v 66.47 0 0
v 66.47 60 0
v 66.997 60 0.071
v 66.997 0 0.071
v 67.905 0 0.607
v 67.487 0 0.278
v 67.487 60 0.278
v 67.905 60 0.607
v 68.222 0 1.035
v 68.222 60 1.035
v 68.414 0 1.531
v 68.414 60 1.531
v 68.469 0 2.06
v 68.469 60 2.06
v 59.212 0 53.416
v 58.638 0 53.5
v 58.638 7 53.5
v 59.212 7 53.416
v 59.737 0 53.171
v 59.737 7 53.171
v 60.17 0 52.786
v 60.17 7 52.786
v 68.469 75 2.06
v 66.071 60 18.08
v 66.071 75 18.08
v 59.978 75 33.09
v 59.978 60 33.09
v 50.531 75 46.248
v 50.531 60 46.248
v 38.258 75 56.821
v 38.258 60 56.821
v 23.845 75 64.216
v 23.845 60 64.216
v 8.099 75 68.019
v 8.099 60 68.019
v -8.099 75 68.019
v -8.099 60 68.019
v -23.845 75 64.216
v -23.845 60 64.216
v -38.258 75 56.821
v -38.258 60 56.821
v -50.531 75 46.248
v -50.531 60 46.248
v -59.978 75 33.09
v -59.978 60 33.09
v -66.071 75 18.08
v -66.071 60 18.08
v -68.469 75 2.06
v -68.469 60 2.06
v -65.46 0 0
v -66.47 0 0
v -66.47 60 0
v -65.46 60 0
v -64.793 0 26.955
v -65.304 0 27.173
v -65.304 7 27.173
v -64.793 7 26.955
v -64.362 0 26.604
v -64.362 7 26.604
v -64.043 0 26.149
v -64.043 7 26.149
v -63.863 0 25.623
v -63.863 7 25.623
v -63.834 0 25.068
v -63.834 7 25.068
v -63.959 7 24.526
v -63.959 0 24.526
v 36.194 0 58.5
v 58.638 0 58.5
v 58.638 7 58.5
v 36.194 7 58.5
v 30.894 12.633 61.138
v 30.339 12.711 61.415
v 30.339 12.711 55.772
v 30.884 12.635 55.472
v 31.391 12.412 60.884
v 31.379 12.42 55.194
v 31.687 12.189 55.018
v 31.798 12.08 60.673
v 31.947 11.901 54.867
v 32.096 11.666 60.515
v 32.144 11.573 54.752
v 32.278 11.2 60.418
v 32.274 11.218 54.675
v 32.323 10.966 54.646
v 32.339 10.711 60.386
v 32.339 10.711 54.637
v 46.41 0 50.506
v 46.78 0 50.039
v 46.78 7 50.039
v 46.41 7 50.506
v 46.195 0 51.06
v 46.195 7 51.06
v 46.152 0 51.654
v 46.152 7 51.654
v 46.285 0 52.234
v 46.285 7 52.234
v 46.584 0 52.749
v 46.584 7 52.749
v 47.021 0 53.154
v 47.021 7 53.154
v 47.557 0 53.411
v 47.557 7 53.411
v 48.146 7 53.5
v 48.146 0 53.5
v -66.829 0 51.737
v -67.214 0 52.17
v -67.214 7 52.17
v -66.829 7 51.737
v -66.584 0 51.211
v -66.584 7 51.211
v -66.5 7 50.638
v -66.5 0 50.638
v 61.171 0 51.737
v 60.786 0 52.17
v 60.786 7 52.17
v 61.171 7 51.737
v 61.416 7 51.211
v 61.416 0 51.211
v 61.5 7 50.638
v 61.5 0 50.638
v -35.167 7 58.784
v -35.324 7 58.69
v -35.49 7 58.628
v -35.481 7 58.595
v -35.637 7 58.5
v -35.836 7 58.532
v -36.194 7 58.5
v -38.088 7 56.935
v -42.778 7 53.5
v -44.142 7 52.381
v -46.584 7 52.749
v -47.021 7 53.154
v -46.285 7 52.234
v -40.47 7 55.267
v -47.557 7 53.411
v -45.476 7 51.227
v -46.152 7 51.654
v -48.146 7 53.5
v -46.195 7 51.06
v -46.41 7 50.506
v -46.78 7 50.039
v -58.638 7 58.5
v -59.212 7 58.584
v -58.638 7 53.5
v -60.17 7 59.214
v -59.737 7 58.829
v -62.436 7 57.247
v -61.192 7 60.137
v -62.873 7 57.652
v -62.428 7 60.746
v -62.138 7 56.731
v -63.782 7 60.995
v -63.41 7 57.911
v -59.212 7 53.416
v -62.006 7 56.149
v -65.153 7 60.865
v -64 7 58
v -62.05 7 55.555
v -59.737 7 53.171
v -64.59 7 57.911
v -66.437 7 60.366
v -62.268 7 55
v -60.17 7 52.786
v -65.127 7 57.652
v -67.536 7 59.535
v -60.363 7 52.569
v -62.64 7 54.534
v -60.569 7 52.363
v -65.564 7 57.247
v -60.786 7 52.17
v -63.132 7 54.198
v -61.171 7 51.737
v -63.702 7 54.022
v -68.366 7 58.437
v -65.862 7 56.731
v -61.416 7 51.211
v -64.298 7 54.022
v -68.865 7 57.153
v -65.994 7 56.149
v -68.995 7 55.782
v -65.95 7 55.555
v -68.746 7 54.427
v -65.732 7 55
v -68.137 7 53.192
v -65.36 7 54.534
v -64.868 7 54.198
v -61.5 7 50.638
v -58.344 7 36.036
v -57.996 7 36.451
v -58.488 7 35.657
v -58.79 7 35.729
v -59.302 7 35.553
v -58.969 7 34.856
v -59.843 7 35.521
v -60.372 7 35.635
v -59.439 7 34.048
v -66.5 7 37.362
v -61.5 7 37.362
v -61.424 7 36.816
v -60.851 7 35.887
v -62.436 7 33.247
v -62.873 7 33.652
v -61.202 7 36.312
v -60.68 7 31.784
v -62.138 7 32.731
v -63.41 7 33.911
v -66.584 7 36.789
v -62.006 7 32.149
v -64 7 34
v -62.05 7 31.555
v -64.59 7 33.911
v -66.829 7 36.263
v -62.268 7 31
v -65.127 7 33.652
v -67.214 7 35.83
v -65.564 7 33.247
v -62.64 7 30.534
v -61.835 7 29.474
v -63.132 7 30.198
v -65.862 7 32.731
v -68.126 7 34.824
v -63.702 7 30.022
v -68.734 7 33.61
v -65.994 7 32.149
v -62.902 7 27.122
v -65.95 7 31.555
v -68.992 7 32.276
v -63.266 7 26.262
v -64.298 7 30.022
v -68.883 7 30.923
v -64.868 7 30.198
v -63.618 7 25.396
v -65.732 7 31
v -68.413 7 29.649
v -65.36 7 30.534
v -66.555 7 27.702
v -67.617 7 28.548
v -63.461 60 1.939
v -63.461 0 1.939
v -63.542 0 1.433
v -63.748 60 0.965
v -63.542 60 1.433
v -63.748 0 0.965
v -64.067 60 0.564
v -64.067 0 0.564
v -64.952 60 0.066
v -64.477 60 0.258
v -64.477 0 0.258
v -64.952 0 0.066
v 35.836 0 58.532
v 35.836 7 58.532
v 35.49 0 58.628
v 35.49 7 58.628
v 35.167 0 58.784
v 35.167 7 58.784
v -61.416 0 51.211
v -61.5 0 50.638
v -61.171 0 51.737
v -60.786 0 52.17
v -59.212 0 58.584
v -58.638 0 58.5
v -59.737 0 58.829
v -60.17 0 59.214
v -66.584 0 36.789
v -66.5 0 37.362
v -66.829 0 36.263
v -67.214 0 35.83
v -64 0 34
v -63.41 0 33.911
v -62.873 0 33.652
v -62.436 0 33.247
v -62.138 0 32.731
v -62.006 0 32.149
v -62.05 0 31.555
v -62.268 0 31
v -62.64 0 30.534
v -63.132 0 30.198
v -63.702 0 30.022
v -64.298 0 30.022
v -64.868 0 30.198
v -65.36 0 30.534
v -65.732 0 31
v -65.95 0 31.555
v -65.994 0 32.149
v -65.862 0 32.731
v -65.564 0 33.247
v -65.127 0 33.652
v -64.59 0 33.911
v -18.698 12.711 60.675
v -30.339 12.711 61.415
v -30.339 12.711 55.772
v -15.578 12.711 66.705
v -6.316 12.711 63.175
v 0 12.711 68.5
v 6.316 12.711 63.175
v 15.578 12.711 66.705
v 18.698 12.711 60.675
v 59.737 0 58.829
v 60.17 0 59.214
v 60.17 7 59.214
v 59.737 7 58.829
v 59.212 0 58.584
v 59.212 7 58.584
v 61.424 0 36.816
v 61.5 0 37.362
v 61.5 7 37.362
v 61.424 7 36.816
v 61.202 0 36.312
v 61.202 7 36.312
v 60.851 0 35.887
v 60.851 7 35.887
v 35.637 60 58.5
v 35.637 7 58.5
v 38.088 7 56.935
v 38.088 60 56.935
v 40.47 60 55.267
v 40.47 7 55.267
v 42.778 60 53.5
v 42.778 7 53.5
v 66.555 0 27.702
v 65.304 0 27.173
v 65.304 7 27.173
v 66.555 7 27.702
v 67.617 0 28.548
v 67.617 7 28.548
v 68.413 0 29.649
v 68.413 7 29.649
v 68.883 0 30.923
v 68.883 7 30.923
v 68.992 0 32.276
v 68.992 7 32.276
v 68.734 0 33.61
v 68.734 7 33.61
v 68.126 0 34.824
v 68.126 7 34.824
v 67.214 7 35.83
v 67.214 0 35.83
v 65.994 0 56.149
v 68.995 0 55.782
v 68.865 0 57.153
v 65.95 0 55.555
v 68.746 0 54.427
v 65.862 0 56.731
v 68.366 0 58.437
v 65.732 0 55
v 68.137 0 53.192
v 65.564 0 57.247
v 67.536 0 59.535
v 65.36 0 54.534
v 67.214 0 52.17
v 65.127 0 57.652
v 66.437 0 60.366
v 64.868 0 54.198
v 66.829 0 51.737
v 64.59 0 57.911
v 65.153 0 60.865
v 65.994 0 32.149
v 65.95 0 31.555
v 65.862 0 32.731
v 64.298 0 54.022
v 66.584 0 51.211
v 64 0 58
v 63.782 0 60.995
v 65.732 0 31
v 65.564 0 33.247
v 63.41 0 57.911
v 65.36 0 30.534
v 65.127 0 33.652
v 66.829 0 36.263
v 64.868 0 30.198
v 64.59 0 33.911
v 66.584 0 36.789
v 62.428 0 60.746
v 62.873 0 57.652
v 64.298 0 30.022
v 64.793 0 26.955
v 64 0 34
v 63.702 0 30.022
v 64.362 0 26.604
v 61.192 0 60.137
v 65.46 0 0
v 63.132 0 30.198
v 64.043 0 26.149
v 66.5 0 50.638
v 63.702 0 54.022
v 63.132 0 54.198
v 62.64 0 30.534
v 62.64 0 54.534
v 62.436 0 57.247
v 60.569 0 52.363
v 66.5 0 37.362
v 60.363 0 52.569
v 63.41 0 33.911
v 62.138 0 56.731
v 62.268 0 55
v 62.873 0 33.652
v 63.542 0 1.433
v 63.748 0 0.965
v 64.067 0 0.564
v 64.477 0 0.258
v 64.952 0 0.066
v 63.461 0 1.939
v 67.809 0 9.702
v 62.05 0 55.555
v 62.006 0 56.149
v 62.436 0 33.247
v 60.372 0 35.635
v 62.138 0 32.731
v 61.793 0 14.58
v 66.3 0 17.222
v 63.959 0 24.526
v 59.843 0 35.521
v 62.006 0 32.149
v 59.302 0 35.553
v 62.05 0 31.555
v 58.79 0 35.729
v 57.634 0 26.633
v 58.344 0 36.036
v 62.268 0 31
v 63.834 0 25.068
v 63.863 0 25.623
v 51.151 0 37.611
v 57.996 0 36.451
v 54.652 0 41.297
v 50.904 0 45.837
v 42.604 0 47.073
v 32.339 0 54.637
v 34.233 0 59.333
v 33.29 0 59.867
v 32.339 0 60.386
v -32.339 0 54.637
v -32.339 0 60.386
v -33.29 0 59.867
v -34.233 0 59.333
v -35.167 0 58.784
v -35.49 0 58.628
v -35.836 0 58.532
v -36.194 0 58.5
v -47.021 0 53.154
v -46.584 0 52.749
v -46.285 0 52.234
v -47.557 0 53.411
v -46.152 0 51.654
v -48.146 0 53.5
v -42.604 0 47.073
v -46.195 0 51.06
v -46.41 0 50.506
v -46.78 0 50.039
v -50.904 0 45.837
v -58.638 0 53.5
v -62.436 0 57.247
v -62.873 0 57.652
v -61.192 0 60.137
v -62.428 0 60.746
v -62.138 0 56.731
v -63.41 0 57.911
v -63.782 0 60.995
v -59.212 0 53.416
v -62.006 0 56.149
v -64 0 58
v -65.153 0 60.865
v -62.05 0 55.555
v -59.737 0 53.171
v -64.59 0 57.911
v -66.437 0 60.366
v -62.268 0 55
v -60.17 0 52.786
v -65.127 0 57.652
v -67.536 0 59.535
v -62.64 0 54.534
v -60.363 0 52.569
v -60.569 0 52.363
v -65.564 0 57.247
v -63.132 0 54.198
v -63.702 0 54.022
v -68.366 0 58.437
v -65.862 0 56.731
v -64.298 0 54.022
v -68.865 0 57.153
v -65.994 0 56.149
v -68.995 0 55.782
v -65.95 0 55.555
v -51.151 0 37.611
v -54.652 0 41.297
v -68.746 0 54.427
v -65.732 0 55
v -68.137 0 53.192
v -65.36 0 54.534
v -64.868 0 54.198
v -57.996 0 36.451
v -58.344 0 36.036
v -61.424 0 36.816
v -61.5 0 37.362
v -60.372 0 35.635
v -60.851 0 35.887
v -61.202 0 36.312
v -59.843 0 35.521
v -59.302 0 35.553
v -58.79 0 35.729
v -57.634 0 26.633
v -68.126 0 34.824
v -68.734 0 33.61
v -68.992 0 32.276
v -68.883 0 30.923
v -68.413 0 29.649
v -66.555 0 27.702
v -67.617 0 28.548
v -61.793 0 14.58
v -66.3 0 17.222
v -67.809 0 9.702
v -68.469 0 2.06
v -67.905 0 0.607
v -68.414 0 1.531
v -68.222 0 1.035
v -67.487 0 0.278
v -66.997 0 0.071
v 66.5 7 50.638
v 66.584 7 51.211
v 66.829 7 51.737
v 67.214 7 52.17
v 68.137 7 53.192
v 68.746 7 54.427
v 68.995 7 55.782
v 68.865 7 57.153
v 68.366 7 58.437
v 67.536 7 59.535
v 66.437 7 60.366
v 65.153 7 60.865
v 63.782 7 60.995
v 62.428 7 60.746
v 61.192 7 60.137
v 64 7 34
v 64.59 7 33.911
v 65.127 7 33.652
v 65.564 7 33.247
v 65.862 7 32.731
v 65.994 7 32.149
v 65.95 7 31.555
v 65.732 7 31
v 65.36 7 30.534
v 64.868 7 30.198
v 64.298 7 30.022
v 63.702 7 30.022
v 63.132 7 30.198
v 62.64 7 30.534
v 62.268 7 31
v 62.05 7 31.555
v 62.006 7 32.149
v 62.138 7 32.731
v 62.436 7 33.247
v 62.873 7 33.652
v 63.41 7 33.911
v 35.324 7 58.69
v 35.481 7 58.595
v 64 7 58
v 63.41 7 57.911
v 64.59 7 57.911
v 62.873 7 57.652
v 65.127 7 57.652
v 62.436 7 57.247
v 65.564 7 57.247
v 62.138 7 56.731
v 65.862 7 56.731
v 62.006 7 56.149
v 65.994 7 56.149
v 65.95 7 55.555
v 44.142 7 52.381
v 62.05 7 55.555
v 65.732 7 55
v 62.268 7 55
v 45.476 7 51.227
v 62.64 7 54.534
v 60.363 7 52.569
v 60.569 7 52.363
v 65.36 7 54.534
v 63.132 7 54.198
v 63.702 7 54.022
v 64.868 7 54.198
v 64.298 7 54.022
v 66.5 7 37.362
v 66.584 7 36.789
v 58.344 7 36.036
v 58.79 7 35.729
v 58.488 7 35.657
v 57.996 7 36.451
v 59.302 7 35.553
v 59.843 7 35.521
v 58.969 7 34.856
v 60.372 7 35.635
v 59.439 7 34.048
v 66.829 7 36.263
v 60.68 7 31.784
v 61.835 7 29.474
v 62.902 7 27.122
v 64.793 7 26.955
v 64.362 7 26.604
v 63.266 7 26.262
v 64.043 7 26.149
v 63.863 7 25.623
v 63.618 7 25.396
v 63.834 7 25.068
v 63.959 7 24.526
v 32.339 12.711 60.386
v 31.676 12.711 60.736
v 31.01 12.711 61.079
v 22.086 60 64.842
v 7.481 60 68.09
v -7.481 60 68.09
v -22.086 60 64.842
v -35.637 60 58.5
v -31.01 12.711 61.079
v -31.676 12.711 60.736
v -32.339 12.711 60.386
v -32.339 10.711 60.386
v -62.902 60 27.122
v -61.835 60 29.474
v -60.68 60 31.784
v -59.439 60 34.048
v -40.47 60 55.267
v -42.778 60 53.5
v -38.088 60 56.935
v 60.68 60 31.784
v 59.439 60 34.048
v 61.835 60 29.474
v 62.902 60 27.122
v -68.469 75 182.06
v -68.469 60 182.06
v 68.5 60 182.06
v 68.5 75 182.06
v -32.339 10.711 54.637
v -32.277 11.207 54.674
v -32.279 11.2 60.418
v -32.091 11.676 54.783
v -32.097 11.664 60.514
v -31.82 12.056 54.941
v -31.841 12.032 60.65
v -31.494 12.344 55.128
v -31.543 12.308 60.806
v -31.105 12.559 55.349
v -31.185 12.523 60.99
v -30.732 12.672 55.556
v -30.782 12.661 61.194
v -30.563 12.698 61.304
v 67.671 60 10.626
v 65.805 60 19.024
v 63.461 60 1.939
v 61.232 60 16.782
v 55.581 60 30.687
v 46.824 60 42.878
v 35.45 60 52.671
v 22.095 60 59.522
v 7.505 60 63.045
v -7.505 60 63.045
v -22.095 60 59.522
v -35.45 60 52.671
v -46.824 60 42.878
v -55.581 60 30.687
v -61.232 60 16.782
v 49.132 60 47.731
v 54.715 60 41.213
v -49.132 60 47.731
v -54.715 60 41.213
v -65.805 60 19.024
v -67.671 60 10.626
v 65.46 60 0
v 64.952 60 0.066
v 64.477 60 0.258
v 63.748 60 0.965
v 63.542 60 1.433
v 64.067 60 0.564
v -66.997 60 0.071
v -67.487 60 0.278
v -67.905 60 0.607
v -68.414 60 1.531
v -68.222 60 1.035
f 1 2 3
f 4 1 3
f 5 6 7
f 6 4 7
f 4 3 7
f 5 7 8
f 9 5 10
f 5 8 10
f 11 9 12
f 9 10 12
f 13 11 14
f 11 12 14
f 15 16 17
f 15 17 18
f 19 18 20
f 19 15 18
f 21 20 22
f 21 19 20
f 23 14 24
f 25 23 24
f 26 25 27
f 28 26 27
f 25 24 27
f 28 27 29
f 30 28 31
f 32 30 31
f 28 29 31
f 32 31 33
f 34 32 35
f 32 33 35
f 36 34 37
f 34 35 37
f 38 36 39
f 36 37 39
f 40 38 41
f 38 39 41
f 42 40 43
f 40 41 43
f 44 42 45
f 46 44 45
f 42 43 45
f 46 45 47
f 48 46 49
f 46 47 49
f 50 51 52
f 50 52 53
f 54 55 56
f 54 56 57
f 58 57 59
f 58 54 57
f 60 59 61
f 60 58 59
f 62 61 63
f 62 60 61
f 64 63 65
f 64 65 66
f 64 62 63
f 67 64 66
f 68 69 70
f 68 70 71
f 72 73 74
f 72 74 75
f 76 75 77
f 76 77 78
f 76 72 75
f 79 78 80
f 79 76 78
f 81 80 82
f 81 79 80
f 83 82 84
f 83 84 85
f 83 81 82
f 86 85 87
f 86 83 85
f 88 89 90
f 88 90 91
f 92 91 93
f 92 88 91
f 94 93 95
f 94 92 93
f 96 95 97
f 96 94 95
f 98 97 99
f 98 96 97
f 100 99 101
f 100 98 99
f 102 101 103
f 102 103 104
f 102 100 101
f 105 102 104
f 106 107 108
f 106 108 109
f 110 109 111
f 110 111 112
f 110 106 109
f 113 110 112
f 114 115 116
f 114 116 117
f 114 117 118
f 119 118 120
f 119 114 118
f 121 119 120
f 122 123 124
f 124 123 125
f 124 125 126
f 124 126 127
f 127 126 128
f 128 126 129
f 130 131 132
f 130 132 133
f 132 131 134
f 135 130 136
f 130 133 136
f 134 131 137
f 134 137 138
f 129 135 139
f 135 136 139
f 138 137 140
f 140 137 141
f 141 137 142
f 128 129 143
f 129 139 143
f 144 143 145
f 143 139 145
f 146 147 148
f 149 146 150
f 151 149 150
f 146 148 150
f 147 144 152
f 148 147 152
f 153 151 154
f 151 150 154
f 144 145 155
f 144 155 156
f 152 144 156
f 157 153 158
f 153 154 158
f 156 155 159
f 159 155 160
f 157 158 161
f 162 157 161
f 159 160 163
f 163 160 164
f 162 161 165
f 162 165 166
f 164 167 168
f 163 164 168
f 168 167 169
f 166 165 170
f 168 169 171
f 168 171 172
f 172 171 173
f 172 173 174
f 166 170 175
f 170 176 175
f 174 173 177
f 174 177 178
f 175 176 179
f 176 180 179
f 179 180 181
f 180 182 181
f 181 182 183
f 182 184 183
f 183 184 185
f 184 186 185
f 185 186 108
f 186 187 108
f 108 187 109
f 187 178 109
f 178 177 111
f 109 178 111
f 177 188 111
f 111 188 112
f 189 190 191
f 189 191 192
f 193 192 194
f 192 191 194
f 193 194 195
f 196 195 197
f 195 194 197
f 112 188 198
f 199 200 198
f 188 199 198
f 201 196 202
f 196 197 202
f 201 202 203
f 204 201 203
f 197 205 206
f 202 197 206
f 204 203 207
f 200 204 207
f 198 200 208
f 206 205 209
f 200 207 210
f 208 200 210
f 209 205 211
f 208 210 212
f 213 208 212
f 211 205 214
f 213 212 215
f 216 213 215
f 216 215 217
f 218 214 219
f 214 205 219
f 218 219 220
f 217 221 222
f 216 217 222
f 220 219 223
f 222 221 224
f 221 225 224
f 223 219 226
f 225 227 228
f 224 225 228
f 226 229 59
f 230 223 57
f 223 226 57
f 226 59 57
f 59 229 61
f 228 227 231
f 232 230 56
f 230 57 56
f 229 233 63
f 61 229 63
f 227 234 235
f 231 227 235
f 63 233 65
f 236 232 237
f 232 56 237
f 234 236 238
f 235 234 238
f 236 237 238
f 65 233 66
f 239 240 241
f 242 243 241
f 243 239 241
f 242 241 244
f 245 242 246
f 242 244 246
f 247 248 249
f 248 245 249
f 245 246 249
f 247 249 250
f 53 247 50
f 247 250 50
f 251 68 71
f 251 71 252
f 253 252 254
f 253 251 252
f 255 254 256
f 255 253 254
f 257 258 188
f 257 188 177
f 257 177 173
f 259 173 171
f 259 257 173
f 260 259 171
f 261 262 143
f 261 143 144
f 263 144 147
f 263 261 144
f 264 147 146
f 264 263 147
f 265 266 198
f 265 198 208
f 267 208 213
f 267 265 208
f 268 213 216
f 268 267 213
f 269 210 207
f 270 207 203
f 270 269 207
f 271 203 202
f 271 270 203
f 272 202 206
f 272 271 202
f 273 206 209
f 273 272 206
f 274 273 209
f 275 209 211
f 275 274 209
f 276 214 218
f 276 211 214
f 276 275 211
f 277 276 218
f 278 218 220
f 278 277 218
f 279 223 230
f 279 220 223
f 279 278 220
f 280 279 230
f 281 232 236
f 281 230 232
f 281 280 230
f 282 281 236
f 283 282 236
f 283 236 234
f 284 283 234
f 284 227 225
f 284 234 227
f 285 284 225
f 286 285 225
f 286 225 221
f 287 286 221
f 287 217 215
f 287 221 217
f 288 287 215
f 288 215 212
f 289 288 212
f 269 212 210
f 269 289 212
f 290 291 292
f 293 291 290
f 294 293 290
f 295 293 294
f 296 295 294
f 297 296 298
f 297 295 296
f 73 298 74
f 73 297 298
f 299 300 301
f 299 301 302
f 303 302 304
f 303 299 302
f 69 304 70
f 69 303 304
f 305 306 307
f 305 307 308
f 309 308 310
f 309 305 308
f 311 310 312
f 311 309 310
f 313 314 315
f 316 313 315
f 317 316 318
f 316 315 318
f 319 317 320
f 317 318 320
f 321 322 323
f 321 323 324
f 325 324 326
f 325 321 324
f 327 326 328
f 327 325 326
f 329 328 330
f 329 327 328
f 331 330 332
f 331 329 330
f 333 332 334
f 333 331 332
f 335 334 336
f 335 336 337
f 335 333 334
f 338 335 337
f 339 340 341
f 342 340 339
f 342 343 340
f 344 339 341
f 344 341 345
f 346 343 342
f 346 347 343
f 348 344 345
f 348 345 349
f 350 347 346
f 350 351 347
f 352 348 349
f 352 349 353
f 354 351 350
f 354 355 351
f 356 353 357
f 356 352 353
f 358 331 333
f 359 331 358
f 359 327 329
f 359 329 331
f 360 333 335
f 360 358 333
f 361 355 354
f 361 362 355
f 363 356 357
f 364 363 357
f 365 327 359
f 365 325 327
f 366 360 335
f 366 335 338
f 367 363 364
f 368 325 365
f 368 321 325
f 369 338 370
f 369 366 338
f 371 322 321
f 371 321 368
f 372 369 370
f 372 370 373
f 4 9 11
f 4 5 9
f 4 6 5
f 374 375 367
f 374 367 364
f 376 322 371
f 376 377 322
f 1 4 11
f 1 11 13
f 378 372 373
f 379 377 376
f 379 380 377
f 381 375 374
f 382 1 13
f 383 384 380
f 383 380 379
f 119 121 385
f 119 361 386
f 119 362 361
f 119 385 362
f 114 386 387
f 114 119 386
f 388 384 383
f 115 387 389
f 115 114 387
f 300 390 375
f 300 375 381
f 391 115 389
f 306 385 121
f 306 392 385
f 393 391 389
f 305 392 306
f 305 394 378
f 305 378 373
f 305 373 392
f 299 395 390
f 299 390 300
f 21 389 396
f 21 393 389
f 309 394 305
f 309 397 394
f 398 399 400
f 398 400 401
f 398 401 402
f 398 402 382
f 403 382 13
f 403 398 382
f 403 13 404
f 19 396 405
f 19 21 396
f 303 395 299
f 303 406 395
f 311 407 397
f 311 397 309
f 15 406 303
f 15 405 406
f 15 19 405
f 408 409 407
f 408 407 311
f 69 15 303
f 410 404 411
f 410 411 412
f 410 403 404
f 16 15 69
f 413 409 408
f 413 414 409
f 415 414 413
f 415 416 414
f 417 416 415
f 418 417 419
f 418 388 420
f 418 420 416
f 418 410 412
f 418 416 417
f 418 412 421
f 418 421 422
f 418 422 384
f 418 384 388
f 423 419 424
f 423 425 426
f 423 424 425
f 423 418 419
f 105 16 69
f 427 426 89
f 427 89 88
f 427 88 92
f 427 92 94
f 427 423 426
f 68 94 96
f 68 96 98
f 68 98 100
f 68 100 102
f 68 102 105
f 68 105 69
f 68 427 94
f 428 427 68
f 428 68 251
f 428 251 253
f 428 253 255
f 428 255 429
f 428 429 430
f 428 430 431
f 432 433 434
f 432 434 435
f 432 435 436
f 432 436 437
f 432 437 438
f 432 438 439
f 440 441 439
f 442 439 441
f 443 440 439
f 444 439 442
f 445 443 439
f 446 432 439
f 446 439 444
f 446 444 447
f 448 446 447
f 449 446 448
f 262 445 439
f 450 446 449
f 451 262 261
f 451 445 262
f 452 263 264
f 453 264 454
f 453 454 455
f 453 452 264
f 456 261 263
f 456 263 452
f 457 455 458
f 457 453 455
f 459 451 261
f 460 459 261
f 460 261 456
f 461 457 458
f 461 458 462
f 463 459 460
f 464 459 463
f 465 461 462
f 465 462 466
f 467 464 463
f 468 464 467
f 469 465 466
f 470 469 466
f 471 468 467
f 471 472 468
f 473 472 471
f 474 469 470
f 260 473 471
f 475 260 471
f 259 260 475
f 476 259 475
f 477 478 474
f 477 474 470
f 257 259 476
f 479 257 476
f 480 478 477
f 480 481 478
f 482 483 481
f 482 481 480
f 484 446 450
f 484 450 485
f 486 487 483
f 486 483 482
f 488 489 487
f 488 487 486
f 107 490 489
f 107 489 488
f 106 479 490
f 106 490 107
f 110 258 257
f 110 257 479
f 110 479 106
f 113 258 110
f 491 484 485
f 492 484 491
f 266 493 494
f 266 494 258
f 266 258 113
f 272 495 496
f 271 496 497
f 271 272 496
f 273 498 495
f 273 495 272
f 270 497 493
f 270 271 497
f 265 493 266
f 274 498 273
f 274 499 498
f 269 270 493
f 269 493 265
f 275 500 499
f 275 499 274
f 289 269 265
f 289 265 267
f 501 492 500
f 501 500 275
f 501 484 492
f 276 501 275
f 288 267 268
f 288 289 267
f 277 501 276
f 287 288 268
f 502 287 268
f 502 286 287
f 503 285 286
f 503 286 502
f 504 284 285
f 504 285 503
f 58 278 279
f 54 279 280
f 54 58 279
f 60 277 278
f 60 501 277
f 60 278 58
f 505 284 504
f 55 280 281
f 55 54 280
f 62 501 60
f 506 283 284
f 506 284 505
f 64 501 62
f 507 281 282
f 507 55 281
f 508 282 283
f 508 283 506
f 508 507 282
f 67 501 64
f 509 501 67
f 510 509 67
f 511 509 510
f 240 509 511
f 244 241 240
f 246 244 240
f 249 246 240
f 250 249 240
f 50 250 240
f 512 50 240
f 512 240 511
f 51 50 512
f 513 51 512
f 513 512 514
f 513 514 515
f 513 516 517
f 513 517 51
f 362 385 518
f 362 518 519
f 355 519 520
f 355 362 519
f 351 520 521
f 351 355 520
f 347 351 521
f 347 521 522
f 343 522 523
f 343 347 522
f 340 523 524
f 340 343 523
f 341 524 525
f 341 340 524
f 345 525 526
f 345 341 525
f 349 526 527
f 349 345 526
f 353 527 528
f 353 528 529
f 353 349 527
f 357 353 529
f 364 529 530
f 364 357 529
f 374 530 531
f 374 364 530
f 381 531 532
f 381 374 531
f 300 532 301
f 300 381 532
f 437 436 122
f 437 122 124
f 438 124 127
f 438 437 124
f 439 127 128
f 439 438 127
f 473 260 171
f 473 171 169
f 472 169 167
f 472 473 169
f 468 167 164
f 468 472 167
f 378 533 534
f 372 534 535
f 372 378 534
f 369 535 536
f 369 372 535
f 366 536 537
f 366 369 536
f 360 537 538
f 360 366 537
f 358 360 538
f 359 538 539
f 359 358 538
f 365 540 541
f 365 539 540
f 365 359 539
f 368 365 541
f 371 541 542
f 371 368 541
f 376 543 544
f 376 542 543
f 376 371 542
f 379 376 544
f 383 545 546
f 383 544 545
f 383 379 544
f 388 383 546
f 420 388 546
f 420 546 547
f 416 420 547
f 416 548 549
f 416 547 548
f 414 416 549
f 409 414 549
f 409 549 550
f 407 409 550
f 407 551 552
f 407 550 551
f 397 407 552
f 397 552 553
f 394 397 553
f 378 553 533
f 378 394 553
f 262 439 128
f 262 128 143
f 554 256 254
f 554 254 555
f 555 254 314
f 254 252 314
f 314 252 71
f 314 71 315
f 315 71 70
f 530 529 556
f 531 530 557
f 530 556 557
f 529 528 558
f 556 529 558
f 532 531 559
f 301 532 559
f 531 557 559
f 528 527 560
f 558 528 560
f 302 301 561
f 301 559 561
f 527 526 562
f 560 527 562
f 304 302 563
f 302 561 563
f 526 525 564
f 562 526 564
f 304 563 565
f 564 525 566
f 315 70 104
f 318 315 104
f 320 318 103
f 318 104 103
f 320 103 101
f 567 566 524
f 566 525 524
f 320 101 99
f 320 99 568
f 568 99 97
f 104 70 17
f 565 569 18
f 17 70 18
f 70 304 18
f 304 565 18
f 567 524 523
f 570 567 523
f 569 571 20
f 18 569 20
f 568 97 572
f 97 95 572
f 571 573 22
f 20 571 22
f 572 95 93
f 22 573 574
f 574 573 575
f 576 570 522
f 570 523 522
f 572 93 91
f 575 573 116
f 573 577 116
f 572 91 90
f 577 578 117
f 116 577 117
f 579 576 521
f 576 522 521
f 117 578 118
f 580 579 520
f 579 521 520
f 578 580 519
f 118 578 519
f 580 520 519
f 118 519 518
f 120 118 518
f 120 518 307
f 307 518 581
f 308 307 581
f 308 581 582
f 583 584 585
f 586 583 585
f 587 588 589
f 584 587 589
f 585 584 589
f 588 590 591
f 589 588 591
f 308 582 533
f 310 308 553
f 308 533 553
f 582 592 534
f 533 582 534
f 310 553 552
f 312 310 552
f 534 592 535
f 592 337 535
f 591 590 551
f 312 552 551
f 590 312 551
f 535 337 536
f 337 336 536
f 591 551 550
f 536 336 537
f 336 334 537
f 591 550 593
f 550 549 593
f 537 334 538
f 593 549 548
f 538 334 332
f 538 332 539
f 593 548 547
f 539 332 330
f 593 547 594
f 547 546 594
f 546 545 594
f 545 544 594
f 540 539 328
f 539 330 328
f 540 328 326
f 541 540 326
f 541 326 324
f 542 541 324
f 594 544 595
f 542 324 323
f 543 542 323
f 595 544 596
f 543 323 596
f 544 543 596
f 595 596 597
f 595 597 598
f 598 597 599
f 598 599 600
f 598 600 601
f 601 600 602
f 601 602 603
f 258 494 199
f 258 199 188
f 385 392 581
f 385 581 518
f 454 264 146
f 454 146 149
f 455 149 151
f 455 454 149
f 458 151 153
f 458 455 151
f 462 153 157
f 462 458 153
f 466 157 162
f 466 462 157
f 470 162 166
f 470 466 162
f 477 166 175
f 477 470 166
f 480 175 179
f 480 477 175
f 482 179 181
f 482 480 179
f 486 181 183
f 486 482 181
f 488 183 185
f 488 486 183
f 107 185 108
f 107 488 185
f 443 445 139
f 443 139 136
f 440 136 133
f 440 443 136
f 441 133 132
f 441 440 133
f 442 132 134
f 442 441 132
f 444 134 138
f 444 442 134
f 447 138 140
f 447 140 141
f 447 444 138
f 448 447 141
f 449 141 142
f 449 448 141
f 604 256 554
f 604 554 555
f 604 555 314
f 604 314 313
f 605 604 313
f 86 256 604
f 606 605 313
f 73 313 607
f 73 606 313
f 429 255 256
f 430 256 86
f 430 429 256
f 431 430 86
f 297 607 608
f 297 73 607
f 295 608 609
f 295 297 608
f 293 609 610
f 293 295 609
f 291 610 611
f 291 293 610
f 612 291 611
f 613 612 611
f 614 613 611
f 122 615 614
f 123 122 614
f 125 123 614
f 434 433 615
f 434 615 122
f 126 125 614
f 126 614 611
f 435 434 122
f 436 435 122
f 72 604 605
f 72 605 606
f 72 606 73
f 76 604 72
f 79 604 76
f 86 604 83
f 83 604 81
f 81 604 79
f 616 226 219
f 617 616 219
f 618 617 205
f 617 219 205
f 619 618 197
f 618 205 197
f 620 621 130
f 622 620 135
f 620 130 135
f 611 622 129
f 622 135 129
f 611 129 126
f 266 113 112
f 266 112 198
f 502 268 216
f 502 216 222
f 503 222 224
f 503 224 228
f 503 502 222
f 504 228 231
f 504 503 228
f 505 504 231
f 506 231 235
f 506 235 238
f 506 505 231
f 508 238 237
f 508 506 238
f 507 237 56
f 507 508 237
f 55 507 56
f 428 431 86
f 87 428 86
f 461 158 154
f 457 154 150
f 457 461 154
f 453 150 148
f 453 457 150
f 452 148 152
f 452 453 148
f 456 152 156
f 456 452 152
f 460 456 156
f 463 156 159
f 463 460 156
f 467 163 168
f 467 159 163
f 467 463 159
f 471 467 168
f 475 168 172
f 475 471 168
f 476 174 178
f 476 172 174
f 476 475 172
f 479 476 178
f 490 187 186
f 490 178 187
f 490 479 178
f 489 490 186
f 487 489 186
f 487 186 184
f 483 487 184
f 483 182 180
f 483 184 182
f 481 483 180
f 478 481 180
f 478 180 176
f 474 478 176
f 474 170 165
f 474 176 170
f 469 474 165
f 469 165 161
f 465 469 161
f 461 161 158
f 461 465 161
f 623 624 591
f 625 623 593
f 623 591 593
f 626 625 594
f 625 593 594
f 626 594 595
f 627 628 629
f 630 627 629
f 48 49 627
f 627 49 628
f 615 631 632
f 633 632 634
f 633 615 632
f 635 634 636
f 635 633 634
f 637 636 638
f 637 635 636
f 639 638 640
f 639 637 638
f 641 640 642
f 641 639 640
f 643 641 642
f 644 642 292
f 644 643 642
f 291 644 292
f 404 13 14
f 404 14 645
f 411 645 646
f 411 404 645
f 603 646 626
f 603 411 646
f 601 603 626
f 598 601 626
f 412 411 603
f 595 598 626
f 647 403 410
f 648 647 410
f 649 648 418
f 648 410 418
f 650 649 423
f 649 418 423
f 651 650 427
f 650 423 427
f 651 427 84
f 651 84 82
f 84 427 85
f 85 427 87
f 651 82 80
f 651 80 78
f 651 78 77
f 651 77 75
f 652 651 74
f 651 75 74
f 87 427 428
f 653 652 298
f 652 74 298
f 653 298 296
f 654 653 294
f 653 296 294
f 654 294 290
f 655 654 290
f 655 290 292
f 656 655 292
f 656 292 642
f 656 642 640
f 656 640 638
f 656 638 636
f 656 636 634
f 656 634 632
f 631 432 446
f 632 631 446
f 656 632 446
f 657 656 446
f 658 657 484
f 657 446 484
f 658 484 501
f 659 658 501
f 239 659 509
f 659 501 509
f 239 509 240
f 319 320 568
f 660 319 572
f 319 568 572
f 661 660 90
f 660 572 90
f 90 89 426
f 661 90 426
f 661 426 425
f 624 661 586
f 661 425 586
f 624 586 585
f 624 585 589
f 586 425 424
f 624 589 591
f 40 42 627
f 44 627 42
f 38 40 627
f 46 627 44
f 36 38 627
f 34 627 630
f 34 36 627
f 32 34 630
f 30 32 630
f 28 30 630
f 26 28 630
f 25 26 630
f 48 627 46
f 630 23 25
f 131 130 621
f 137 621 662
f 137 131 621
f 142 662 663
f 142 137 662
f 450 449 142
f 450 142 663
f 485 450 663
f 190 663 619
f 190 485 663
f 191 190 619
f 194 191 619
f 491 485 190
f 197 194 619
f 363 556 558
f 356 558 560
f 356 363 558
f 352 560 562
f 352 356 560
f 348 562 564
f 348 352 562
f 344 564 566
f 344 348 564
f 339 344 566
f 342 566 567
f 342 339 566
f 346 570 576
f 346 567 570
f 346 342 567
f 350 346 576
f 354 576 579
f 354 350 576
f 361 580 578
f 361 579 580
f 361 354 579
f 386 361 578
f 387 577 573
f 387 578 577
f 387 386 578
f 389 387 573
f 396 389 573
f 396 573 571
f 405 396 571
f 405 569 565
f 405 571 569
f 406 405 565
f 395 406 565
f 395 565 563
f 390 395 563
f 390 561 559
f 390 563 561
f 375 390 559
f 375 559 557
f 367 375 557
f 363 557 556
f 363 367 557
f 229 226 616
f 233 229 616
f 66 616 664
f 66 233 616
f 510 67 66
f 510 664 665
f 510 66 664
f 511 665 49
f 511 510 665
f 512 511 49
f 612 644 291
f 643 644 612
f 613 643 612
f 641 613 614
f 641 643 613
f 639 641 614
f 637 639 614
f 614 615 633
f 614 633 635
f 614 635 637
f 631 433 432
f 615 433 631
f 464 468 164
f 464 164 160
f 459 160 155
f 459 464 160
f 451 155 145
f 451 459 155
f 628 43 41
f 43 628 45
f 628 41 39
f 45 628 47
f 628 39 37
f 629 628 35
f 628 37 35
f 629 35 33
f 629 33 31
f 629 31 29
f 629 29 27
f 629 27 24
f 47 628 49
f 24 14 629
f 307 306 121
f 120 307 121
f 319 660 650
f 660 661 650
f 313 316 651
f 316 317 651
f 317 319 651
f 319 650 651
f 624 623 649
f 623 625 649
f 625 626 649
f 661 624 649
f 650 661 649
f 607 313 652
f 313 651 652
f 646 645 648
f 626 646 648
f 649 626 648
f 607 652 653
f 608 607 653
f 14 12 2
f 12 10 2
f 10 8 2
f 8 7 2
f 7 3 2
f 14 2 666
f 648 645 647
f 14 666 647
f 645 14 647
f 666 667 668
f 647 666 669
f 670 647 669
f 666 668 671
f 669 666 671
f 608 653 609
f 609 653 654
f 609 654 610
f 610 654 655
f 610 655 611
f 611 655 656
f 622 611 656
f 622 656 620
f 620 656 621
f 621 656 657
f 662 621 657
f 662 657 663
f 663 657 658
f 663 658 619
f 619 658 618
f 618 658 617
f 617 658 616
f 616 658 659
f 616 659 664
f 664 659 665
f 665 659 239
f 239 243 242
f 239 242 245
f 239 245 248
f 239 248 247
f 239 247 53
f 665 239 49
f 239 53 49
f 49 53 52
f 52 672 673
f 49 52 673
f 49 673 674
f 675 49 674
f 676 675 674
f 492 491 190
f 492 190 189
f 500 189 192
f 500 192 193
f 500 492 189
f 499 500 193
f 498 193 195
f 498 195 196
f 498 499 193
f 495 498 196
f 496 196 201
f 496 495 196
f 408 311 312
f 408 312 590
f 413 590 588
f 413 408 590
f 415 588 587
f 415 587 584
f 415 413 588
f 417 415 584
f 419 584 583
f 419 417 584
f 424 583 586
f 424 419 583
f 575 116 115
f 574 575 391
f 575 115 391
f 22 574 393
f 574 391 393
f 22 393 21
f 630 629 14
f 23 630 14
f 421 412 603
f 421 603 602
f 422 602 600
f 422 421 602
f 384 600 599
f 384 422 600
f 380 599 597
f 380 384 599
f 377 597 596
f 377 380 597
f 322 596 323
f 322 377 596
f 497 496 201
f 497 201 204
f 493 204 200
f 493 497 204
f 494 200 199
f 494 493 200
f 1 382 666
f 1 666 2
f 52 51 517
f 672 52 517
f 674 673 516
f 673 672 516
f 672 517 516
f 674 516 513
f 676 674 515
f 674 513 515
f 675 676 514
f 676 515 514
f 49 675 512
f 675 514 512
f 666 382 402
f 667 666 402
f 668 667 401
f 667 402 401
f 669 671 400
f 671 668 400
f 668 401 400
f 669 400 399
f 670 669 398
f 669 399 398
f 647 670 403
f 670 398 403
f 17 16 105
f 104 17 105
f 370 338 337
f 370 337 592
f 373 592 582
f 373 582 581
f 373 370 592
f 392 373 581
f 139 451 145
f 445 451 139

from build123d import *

# Parameters (mm, degrees)
SKETCH1_R           = 2
BOSS_EXTRUDE1_DEPTH = 60
CUT_EXTRUDE1_START  = -53
SKETCH2_R           = 90.041166502
SKETCH2_R_2         = 68.5
CUT_EXTRUDE1_DEPTH  = 53
SKETCH3_W           = 64.67850159
SKETCH3_H           = 25.422058074
CUT_EXTRUDE2_DEPTH  = 55
FILLET1_R           = 2
BOSS_EXTRUDE2_DEPTH = 15


with BuildPart() as part:
    # Sketch1 → Boss-Extrude1 (new body)
    with BuildSketch(Plane(origin=(0, 0, 0), x_dir=(1, 0, 0), z_dir=(0, 1, 0))):
        with BuildLine():
            Line((63.490136384, 0), (68.5, 0))
            ThreePointArc((68.5, 0), (67.085865229, -13.846901692), (62.90184857, -27.122084109))
            ThreePointArc((62.90184857, -27.122084109), (68.657126641, -30.180337544), (66.499734232, -36.330280449))
            Line((66.499734232, -36.330280449), (66.499734232, -51.669719551))
            ThreePointArc((66.499734232, -51.669719551), (67.535642402, -59.535425407), (59.669872981, -58.5))
            Line((59.669872981, -58.5), (35.637059362, -58.5))
            ThreePointArc((35.637059362, -58.5), (0, -68.5), (-35.637059362, -58.5))
            Line((-35.637059362, -58.5), (-59.669872981, -58.5))
            ThreePointArc((-59.669872981, -58.5), (-67.535642402, -59.535425407), (-66.499734232, -51.669719551))
            Line((-66.499734232, -51.669719551), (-66.499734232, -36.330280449))
            ThreePointArc((-66.499734232, -36.330280449), (-68.657126641, -30.180337544), (-62.90184857, -27.122084109))
            ThreePointArc((-62.90184857, -27.122084109), (-67.085865229, -13.846901692), (-68.5, 0))
            Line((-68.5, 0), (-63.490136384, 0))
            ThreePointArc((-63.490136384, 0), (0, -63.490136384), (63.490136384, 0))
        make_face()
        with Locations(Location((-64, -32, 0), (0, 0, 270))):
            Circle(SKETCH1_R, mode=Mode.SUBTRACT)
        with Locations(Location((64, -32, 0), (0, 0, 270))):
            Circle(SKETCH1_R, mode=Mode.SUBTRACT)
        with Locations(Location((64, -56, 0), (0, 0, 270))):
            Circle(SKETCH1_R, mode=Mode.SUBTRACT)
        with Locations(Location((-64, -56, 0), (0, 0, 270))):
            Circle(SKETCH1_R, mode=Mode.SUBTRACT)
        with BuildLine():
            Line((61.500265768, -36.330280449), (61.500265768, -51.669719551))
            ThreePointArc((61.500265768, -51.669719551), (60.464574593, -52.464357598), (59.669872981, -53.5))
            Line((59.669872981, -53.5), (42.778499272, -53.5))
            ThreePointArc((42.778499272, -53.5), (52.025817799, -44.55967103), (59.43877643, -34.048228391))
            ThreePointArc((59.43877643, -34.048228391), (60.289714071, -35.35168291), (61.500265768, -36.330280449))
        make_face(mode=Mode.SUBTRACT)
        with BuildLine():
            Line((-59.669872981, -53.5), (-42.778499272, -53.5))
            ThreePointArc((-42.778499272, -53.5), (-52.025817799, -44.55967103), (-59.43877643, -34.048228391))
            ThreePointArc((-59.43877643, -34.048228391), (-60.289714071, -35.35168291), (-61.500265768, -36.330280449))
            Line((-61.500265768, -36.330280449), (-61.500265768, -51.669719551))
            ThreePointArc((-61.500265768, -51.669719551), (-60.464574593, -52.464357598), (-59.669872981, -53.5))
        make_face(mode=Mode.SUBTRACT)
    extrude(amount=BOSS_EXTRUDE1_DEPTH)

    # Sketch2 → Cut-Extrude1 (cut)
    with BuildSketch(Plane(origin=(0, 60, 0), x_dir=(1, 0, 0), z_dir=(0, 1, 0)).offset(CUT_EXTRUDE1_START)):
        Circle(SKETCH2_R)
        Circle(SKETCH2_R_2, mode=Mode.SUBTRACT)
    extrude(amount=CUT_EXTRUDE1_DEPTH, mode=Mode.SUBTRACT)

    # Sketch3 → Cut-Extrude2 (cut)
    with BuildSketch(Plane(origin=(0, 60, 68.5), x_dir=(1, 0, 0), z_dir=(0, 0, 1))):
        with Locations((0, -60)):
            Rectangle(SKETCH3_W, SKETCH3_H)
    extrude(amount=-CUT_EXTRUDE2_DEPTH, mode=Mode.SUBTRACT)

    # Fillet1
    # the kernel refuses this fillet: 2 mm, written as the material it adds along each edge
    with BuildSketch(Plane(origin=(62.90184857, 0, 27.122084109), x_dir=(0.9997743783027363, 0, 0.02124129208351232), z_dir=(0, 1, 0))) as fillet1_piece_1:
        with BuildLine():
            CenterArc((2.883640558, 1.941395669), FILLET1_R, 160.236767208, 95.858786022)
            ThreePointArc((1.001444665, 2.617663827), (0.514111494, 1.303709596), (0, 0))
            ThreePointArc((0, 0), (1.201516899, 0.146510828), (2.403033798, 0))
        make_face()
    extrude(amount=7)
    with BuildSketch(Plane(origin=(66.499734232, 0, 36.330280449), x_dir=(0.8191578281035011, 0, -0.5735681761192429), z_dir=(0, 1, 0)), Plane(origin=(-66.499734232, 0, 51.669719551), x_dir=(-0.8191578281038059, 0, 0.5735681761188076), z_dir=(0, 1, 0))) as fillet1_piece_2:
        with BuildLine():
            CenterArc((1.046482067, -1.992380453), FILLET1_R, 95.002938786, 49.997638975)
            Line((-0.591833589, -0.845244101), (0, 0))
            ThreePointArc((0, 0), (0.436034195, -0.019048868), (0.87206839, 0))
        make_face()
    extrude(amount=7)
    with BuildSketch(Plane(origin=(66.499734232, 0, 51.669719551), x_dir=(0, 0, -1), z_dir=(0, 1, 0)), Plane(origin=(-66.499734232, 0, 36.330280449), x_dir=(0, 0, 1), z_dir=(0, 1, 0))) as fillet1_piece_3:
        with BuildLine():
            CenterArc((1.031845234, -2), FILLET1_R, 90, 49.997638975)
            ThreePointArc((-0.500190676, -0.714361648), (-0.234491309, -0.368106648), (0, 0))
            Line((0, 0), (1.031845234, 0))
        make_face()
    extrude(amount=7)
    with BuildSketch(Plane(origin=(59.669872981, 0, 58.5), x_dir=(0.5736136140260999, 0, 0.8191260109433204), z_dir=(0, 1, 0))) as fillet1_piece_4:
        with BuildLine():
            CenterArc((1.046411475, -1.992381483), FILLET1_R, 95.002600442, 49.994799115)
            Line((-0.591840547, -0.845154255), (0, 0))
            ThreePointArc((0, 0), (0.436004781, -0.019046293), (0.872009562, 0))
        make_face()
    extrude(amount=7)
    with BuildSketch(Plane(origin=(35.637059362, 0, 58.5), x_dir=(1, 0, 0), z_dir=(0, 1, 0))) as fillet1_piece_5:
        with BuildLine():
            CenterArc((0.556862779, -2), FILLET1_R, 90, 30.889831942)
            ThreePointArc((-0.469915154, -0.283687943), (-0.234673418, -0.142314667), (0, 0))
            Line((0, 0), (0.556862779, 0))
        make_face()
    extrude(amount=7)
    with BuildSketch(Plane(origin=(-35.637059362, 0, 58.5), x_dir=(0.85609218491347, 0, 0.5168231524710181), z_dir=(0, 1, 0))) as fillet1_piece_6:
        with BuildLine():
            CenterArc((0.556920432, -1.999983947), FILLET1_R, 90.229563134, 30.889831942)
            Line((-0.476725873, -0.287799577), (0, 0))
            ThreePointArc((0, 0), (0.274453594, -0.000549818), (0.548907188, 0))
        make_face()
    extrude(amount=7)
    with BuildSketch(Plane(origin=(-59.669872981, 0, 58.5), x_dir=(1, 0, 0), z_dir=(0, 1, 0))) as fillet1_piece_7:
        with BuildLine():
            CenterArc((1.031775628, -2), FILLET1_R, 90, 49.994799115)
            ThreePointArc((-0.500196557, -0.714285714), (-0.234496964, -0.36806807), (0, 0))
            Line((0, 0), (1.031775628, 0))
        make_face()
    extrude(amount=7)
    with BuildSketch(Plane(origin=(-62.90184857, 0, 27.122084109), x_dir=(-0.3770742927095456, 0, -0.9261830152716016), z_dir=(0, 1, 0))) as fillet1_piece_8:
        with BuildLine():
            CenterArc((2.843602303, 1.999581444), FILLET1_R, 172.968999754, 95.858786022)
            ThreePointArc((0.858642167, 2.244394142), (0.566159793, 1.069846424), (0, 0))
            ThreePointArc((0, 0), (1.401343581, 0.014335543), (2.802687162, 0))
        make_face()
    extrude(amount=7)
    with BuildSketch(Plane(origin=(32.339250795, 12.711029037, 65.385617973), x_dir=(-1, 0, 0), z_dir=(0, 0, -1))) as fillet1_piece_9_section:
        with BuildLine():
            CenterArc((FILLET1_R, -FILLET1_R), FILLET1_R, 90, 90)
            Line((0, -FILLET1_R), (0, 0))
            Line((0, 0), (FILLET1_R, 0))
        make_face()
    fillet1_piece_9 = extrude(amount=15.748906176, mode=Mode.PRIVATE)
    fillet1_piece_9 = fillet1_piece_9 & Plane(origin=(0, 12.25719498, 0), x_dir=(1, 0, 0), z_dir=(0, -1, 0)) * Cylinder(68.5, 40, mode=Mode.PRIVATE)
    fillet1_piece_9 = fillet1_piece_9 - Plane(origin=(0, 12.25719498, 0), x_dir=(-1, 0, 0), z_dir=(0, -1, 0)) * Cylinder(63.490136384, 40, mode=Mode.PRIVATE)
    add(fillet1_piece_9)
    with BuildSketch(Plane(origin=(-32.339250795, 12.711029037, 65.385617973), x_dir=(1, 0, 0), z_dir=(0, 0, -1))) as fillet1_piece_10_section:
        with BuildLine():
            CenterArc((FILLET1_R, FILLET1_R), FILLET1_R, 180, 90)
            Line((0, FILLET1_R), (0, 0))
            Line((0, 0), (FILLET1_R, 0))
        make_face()
    fillet1_piece_10 = extrude(amount=15.748906176, mode=Mode.PRIVATE)
    fillet1_piece_10 = fillet1_piece_10 & Plane(origin=(0, 12.25719498, 0), x_dir=(1, 0, 0), z_dir=(0, -1, 0)) * Cylinder(68.5, 40, mode=Mode.PRIVATE)
    fillet1_piece_10 = fillet1_piece_10 - Plane(origin=(0, 12.25719498, 0), x_dir=(-1, 0, 0), z_dir=(0, -1, 0)) * Cylinder(63.490136384, 40, mode=Mode.PRIVATE)
    add(fillet1_piece_10)
    with BuildSketch(Plane(origin=(-61.500265768, 0, 36.330280449), x_dir=(0, 0, 1), z_dir=(0, 1, 0)), Plane(origin=(61.500265768, 0, 51.669719551), x_dir=(0, 0, -1), z_dir=(0, 1, 0))) as fillet1_piece_11:
        with BuildLine():
            CenterArc((1.031845234, 2), FILLET1_R, 220.002361025, 49.997638975)
            ThreePointArc((-0.500190676, 0.714361648), (-0.234491309, 0.368106648), (0, 0))
            Line((0, 0), (1.031845234, 0))
        make_face()
    extrude(amount=7)
    with BuildSketch(Plane(origin=(-61.500265768, 0, 51.669719551), x_dir=(0.8191578281038006, 0, 0.5735681761188153), z_dir=(0, 1, 0)), Plane(origin=(61.500265768, 0, 36.330280449), x_dir=(-0.8191578281034525, 0, -0.5735681761193124), z_dir=(0, 1, 0))) as fillet1_piece_12:
        with BuildLine():
            CenterArc((1.046482067, 1.992380453), FILLET1_R, 214.999422238, 49.997638975)
            Line((-0.591833589, 0.845244101), (0, 0))
            ThreePointArc((0, 0), (0.436034195, 0.019048868), (0.87206839, 0))
        make_face()
    extrude(amount=7)
    with BuildSketch(Plane(origin=(-59.43877643, 0, 34.048228391), x_dir=(0.514701836591563, 0, 0.8573692433305922), z_dir=(0, 1, 0))) as fillet1_piece_13:
        with BuildLine():
            CenterArc((2.843602303, -1.999581444), FILLET1_R, 91.172214224, 95.858786022)
            ThreePointArc((0.858642167, -2.244394142), (0.566159793, -1.069846424), (0, 0))
            ThreePointArc((0, 0), (1.401343581, -0.014335543), (2.802687162, 0))
        make_face()
    extrude(amount=7)
    with BuildSketch(Plane(origin=(-42.778499272, 0, 53.5), x_dir=(-0.7563233086110386, 0, -0.6541980226595399), z_dir=(0, 1, 0))) as fillet1_piece_14:
        with BuildLine():
            CenterArc((5.367668856, 1.998508223), FILLET1_R, 130.858867725, 136.928029694)
            Line((4.05927281, 3.51115484), (0, 0))
            ThreePointArc((0, 0), (2.645218105, 0.051093353), (5.29043621, 0))
        make_face()
    extrude(amount=7)
    with BuildSketch(Plane(origin=(-59.669872981, 0, 53.5), x_dir=(1, 0, 0), z_dir=(0, 1, 0))) as fillet1_piece_15:
        with BuildLine():
            CenterArc((1.031775628, 2), FILLET1_R, 220.005200885, 49.994799115)
            ThreePointArc((-0.500196557, 0.714285714), (-0.234496964, 0.36806807), (0, 0))
            Line((0, 0), (1.031775628, 0))
        make_face()
    extrude(amount=7)
    with BuildSketch(Plane(origin=(59.669872981, 0, 53.5), x_dir=(0.5736136140255318, 0, -0.8191260109437182), z_dir=(0, 1, 0))) as fillet1_piece_16:
        with BuildLine():
            CenterArc((1.046411475, 1.992381483), FILLET1_R, 215.002600442, 49.994799115)
            Line((-0.591840547, 0.845154255), (0, 0))
            ThreePointArc((0, 0), (0.436004781, 0.019046293), (0.872009562, 0))
        make_face()
    extrude(amount=7)
    with BuildSketch(Plane(origin=(42.778499272, 0, 53.5), x_dir=(0.7563233086109976, 0, -0.654198022659587), z_dir=(0, 1, 0))) as fillet1_piece_17:
        with BuildLine():
            CenterArc((5.367668856, -1.998508223), FILLET1_R, 92.213102581, 136.928029694)
            Line((4.05927281, -3.51115484), (0, 0))
            ThreePointArc((0, 0), (2.645218105, -0.051093353), (5.29043621, 0))
        make_face()
    extrude(amount=7)
    with BuildSketch(Plane(origin=(59.43877643, 0, 34.048228391), x_dir=(0.6168576606483469, 0, 0.7870747273921637), z_dir=(0, 1, 0))) as fillet1_piece_18:
        with BuildLine():
            CenterArc((2.883640558, -1.941395669), FILLET1_R, 103.904446769, 95.858786022)
            ThreePointArc((1.001444665, -2.617663827), (0.514111494, -1.303709596), (0, 0))
            ThreePointArc((0, 0), (1.201516899, -0.146510828), (2.403033798, 0))
        make_face()
    extrude(amount=7)
    # the kernel refuses this fillet: 2 mm, written as the material it takes off along each edge
    with BuildSketch(Plane(origin=(63.490136384, -4.923634816, 0), x_dir=(1, 0, 0), z_dir=(0, 1, 0))) as fillet1_2_piece_1:
        with BuildLine():
            CenterArc((1.969453926, -2), FILLET1_R, 90, 88.249974963)
            ThreePointArc((-0.029613229, -1.9389221), (-0.007403739, -0.969574114), (0, 0))
            Line((0, 0), (1.969453926, 0))
        make_face()
    extrude(amount=69.847269632, mode=Mode.SUBTRACT)
    with BuildSketch(Plane(origin=(68.5, 65.150958496, 0), x_dir=(-1, 0, 0), z_dir=(0, -1, 0)), Plane(origin=(-68.5, -5.150958496, 0), x_dir=(1, 0, 0), z_dir=(0, 1, 0))) as fillet1_2_piece_2:
        with BuildLine():
            CenterArc((2.030081992, -2), FILLET1_R, 90, 91.723441219)
            ThreePointArc((0.030986713, -2.060150376), (0.007747116, -1.030191699), (0, 0))
            Line((0, 0), (2.030081992, 0))
        make_face()
    extrude(amount=70.301916991, mode=Mode.SUBTRACT)
    with BuildSketch(Plane(origin=(-63.490136384, -4.923634816, 0), x_dir=(-1, 0, 0), z_dir=(0, 1, 0))) as fillet1_2_piece_3:
        with BuildLine():
            CenterArc((1.969453926, 2), FILLET1_R, 181.750025037, 88.249974963)
            ThreePointArc((-0.029613229, 1.9389221), (-0.007403739, 0.969574114), (0, 0))
            Line((0, 0), (1.969453926, 0))
        make_face()
    extrude(amount=69.847269632, mode=Mode.SUBTRACT)


with BuildPart() as body_2:
    # Sketch4 → Boss-Extrude2 (new body)
    with BuildSketch(Plane(origin=(0, 60, 0), x_dir=(1, 0, 0), z_dir=(0, 1, 0))):
        with BuildLine():
            Line((-68.469013287, -2.060150376), (-68.469013287, -182.060150376))
            Line((-68.469013287, -182.060150376), (68.5, -182.060150376))
            Line((68.5, -182.060150376), (68.469013287, -2.060150376))
            ThreePointArc((68.469013287, -2.060150376), (0, -68.5), (-68.469013287, -2.060150376))
        make_face()
    extrude(amount=BOSS_EXTRUDE2_DEPTH)


solid = Compound([part.part, body_2.part])
